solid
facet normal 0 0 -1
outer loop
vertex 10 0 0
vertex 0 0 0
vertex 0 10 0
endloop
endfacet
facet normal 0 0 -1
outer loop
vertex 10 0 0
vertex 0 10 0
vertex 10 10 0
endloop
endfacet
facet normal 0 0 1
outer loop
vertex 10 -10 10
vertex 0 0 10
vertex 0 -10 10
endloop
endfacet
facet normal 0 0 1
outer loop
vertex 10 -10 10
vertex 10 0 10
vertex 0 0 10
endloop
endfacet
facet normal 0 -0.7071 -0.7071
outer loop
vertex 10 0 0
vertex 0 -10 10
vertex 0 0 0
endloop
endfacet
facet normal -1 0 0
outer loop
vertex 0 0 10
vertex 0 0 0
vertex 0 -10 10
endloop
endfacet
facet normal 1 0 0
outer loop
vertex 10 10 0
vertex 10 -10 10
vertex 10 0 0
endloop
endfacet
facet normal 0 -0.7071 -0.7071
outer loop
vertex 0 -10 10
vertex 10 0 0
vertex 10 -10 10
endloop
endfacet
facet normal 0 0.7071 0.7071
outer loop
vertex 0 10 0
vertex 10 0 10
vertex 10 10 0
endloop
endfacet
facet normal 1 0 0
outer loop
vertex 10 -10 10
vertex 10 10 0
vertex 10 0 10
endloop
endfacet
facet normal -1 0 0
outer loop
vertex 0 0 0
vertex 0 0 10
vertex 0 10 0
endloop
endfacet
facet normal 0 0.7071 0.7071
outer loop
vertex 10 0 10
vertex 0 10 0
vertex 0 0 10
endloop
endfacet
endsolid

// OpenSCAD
// segments=0 disables subdivision, even with twist: the square keeps its
// 4 vertices per ring.
linear_extrude(height = 10, twist = 90, slices = 1, segments = 0) square(10);
